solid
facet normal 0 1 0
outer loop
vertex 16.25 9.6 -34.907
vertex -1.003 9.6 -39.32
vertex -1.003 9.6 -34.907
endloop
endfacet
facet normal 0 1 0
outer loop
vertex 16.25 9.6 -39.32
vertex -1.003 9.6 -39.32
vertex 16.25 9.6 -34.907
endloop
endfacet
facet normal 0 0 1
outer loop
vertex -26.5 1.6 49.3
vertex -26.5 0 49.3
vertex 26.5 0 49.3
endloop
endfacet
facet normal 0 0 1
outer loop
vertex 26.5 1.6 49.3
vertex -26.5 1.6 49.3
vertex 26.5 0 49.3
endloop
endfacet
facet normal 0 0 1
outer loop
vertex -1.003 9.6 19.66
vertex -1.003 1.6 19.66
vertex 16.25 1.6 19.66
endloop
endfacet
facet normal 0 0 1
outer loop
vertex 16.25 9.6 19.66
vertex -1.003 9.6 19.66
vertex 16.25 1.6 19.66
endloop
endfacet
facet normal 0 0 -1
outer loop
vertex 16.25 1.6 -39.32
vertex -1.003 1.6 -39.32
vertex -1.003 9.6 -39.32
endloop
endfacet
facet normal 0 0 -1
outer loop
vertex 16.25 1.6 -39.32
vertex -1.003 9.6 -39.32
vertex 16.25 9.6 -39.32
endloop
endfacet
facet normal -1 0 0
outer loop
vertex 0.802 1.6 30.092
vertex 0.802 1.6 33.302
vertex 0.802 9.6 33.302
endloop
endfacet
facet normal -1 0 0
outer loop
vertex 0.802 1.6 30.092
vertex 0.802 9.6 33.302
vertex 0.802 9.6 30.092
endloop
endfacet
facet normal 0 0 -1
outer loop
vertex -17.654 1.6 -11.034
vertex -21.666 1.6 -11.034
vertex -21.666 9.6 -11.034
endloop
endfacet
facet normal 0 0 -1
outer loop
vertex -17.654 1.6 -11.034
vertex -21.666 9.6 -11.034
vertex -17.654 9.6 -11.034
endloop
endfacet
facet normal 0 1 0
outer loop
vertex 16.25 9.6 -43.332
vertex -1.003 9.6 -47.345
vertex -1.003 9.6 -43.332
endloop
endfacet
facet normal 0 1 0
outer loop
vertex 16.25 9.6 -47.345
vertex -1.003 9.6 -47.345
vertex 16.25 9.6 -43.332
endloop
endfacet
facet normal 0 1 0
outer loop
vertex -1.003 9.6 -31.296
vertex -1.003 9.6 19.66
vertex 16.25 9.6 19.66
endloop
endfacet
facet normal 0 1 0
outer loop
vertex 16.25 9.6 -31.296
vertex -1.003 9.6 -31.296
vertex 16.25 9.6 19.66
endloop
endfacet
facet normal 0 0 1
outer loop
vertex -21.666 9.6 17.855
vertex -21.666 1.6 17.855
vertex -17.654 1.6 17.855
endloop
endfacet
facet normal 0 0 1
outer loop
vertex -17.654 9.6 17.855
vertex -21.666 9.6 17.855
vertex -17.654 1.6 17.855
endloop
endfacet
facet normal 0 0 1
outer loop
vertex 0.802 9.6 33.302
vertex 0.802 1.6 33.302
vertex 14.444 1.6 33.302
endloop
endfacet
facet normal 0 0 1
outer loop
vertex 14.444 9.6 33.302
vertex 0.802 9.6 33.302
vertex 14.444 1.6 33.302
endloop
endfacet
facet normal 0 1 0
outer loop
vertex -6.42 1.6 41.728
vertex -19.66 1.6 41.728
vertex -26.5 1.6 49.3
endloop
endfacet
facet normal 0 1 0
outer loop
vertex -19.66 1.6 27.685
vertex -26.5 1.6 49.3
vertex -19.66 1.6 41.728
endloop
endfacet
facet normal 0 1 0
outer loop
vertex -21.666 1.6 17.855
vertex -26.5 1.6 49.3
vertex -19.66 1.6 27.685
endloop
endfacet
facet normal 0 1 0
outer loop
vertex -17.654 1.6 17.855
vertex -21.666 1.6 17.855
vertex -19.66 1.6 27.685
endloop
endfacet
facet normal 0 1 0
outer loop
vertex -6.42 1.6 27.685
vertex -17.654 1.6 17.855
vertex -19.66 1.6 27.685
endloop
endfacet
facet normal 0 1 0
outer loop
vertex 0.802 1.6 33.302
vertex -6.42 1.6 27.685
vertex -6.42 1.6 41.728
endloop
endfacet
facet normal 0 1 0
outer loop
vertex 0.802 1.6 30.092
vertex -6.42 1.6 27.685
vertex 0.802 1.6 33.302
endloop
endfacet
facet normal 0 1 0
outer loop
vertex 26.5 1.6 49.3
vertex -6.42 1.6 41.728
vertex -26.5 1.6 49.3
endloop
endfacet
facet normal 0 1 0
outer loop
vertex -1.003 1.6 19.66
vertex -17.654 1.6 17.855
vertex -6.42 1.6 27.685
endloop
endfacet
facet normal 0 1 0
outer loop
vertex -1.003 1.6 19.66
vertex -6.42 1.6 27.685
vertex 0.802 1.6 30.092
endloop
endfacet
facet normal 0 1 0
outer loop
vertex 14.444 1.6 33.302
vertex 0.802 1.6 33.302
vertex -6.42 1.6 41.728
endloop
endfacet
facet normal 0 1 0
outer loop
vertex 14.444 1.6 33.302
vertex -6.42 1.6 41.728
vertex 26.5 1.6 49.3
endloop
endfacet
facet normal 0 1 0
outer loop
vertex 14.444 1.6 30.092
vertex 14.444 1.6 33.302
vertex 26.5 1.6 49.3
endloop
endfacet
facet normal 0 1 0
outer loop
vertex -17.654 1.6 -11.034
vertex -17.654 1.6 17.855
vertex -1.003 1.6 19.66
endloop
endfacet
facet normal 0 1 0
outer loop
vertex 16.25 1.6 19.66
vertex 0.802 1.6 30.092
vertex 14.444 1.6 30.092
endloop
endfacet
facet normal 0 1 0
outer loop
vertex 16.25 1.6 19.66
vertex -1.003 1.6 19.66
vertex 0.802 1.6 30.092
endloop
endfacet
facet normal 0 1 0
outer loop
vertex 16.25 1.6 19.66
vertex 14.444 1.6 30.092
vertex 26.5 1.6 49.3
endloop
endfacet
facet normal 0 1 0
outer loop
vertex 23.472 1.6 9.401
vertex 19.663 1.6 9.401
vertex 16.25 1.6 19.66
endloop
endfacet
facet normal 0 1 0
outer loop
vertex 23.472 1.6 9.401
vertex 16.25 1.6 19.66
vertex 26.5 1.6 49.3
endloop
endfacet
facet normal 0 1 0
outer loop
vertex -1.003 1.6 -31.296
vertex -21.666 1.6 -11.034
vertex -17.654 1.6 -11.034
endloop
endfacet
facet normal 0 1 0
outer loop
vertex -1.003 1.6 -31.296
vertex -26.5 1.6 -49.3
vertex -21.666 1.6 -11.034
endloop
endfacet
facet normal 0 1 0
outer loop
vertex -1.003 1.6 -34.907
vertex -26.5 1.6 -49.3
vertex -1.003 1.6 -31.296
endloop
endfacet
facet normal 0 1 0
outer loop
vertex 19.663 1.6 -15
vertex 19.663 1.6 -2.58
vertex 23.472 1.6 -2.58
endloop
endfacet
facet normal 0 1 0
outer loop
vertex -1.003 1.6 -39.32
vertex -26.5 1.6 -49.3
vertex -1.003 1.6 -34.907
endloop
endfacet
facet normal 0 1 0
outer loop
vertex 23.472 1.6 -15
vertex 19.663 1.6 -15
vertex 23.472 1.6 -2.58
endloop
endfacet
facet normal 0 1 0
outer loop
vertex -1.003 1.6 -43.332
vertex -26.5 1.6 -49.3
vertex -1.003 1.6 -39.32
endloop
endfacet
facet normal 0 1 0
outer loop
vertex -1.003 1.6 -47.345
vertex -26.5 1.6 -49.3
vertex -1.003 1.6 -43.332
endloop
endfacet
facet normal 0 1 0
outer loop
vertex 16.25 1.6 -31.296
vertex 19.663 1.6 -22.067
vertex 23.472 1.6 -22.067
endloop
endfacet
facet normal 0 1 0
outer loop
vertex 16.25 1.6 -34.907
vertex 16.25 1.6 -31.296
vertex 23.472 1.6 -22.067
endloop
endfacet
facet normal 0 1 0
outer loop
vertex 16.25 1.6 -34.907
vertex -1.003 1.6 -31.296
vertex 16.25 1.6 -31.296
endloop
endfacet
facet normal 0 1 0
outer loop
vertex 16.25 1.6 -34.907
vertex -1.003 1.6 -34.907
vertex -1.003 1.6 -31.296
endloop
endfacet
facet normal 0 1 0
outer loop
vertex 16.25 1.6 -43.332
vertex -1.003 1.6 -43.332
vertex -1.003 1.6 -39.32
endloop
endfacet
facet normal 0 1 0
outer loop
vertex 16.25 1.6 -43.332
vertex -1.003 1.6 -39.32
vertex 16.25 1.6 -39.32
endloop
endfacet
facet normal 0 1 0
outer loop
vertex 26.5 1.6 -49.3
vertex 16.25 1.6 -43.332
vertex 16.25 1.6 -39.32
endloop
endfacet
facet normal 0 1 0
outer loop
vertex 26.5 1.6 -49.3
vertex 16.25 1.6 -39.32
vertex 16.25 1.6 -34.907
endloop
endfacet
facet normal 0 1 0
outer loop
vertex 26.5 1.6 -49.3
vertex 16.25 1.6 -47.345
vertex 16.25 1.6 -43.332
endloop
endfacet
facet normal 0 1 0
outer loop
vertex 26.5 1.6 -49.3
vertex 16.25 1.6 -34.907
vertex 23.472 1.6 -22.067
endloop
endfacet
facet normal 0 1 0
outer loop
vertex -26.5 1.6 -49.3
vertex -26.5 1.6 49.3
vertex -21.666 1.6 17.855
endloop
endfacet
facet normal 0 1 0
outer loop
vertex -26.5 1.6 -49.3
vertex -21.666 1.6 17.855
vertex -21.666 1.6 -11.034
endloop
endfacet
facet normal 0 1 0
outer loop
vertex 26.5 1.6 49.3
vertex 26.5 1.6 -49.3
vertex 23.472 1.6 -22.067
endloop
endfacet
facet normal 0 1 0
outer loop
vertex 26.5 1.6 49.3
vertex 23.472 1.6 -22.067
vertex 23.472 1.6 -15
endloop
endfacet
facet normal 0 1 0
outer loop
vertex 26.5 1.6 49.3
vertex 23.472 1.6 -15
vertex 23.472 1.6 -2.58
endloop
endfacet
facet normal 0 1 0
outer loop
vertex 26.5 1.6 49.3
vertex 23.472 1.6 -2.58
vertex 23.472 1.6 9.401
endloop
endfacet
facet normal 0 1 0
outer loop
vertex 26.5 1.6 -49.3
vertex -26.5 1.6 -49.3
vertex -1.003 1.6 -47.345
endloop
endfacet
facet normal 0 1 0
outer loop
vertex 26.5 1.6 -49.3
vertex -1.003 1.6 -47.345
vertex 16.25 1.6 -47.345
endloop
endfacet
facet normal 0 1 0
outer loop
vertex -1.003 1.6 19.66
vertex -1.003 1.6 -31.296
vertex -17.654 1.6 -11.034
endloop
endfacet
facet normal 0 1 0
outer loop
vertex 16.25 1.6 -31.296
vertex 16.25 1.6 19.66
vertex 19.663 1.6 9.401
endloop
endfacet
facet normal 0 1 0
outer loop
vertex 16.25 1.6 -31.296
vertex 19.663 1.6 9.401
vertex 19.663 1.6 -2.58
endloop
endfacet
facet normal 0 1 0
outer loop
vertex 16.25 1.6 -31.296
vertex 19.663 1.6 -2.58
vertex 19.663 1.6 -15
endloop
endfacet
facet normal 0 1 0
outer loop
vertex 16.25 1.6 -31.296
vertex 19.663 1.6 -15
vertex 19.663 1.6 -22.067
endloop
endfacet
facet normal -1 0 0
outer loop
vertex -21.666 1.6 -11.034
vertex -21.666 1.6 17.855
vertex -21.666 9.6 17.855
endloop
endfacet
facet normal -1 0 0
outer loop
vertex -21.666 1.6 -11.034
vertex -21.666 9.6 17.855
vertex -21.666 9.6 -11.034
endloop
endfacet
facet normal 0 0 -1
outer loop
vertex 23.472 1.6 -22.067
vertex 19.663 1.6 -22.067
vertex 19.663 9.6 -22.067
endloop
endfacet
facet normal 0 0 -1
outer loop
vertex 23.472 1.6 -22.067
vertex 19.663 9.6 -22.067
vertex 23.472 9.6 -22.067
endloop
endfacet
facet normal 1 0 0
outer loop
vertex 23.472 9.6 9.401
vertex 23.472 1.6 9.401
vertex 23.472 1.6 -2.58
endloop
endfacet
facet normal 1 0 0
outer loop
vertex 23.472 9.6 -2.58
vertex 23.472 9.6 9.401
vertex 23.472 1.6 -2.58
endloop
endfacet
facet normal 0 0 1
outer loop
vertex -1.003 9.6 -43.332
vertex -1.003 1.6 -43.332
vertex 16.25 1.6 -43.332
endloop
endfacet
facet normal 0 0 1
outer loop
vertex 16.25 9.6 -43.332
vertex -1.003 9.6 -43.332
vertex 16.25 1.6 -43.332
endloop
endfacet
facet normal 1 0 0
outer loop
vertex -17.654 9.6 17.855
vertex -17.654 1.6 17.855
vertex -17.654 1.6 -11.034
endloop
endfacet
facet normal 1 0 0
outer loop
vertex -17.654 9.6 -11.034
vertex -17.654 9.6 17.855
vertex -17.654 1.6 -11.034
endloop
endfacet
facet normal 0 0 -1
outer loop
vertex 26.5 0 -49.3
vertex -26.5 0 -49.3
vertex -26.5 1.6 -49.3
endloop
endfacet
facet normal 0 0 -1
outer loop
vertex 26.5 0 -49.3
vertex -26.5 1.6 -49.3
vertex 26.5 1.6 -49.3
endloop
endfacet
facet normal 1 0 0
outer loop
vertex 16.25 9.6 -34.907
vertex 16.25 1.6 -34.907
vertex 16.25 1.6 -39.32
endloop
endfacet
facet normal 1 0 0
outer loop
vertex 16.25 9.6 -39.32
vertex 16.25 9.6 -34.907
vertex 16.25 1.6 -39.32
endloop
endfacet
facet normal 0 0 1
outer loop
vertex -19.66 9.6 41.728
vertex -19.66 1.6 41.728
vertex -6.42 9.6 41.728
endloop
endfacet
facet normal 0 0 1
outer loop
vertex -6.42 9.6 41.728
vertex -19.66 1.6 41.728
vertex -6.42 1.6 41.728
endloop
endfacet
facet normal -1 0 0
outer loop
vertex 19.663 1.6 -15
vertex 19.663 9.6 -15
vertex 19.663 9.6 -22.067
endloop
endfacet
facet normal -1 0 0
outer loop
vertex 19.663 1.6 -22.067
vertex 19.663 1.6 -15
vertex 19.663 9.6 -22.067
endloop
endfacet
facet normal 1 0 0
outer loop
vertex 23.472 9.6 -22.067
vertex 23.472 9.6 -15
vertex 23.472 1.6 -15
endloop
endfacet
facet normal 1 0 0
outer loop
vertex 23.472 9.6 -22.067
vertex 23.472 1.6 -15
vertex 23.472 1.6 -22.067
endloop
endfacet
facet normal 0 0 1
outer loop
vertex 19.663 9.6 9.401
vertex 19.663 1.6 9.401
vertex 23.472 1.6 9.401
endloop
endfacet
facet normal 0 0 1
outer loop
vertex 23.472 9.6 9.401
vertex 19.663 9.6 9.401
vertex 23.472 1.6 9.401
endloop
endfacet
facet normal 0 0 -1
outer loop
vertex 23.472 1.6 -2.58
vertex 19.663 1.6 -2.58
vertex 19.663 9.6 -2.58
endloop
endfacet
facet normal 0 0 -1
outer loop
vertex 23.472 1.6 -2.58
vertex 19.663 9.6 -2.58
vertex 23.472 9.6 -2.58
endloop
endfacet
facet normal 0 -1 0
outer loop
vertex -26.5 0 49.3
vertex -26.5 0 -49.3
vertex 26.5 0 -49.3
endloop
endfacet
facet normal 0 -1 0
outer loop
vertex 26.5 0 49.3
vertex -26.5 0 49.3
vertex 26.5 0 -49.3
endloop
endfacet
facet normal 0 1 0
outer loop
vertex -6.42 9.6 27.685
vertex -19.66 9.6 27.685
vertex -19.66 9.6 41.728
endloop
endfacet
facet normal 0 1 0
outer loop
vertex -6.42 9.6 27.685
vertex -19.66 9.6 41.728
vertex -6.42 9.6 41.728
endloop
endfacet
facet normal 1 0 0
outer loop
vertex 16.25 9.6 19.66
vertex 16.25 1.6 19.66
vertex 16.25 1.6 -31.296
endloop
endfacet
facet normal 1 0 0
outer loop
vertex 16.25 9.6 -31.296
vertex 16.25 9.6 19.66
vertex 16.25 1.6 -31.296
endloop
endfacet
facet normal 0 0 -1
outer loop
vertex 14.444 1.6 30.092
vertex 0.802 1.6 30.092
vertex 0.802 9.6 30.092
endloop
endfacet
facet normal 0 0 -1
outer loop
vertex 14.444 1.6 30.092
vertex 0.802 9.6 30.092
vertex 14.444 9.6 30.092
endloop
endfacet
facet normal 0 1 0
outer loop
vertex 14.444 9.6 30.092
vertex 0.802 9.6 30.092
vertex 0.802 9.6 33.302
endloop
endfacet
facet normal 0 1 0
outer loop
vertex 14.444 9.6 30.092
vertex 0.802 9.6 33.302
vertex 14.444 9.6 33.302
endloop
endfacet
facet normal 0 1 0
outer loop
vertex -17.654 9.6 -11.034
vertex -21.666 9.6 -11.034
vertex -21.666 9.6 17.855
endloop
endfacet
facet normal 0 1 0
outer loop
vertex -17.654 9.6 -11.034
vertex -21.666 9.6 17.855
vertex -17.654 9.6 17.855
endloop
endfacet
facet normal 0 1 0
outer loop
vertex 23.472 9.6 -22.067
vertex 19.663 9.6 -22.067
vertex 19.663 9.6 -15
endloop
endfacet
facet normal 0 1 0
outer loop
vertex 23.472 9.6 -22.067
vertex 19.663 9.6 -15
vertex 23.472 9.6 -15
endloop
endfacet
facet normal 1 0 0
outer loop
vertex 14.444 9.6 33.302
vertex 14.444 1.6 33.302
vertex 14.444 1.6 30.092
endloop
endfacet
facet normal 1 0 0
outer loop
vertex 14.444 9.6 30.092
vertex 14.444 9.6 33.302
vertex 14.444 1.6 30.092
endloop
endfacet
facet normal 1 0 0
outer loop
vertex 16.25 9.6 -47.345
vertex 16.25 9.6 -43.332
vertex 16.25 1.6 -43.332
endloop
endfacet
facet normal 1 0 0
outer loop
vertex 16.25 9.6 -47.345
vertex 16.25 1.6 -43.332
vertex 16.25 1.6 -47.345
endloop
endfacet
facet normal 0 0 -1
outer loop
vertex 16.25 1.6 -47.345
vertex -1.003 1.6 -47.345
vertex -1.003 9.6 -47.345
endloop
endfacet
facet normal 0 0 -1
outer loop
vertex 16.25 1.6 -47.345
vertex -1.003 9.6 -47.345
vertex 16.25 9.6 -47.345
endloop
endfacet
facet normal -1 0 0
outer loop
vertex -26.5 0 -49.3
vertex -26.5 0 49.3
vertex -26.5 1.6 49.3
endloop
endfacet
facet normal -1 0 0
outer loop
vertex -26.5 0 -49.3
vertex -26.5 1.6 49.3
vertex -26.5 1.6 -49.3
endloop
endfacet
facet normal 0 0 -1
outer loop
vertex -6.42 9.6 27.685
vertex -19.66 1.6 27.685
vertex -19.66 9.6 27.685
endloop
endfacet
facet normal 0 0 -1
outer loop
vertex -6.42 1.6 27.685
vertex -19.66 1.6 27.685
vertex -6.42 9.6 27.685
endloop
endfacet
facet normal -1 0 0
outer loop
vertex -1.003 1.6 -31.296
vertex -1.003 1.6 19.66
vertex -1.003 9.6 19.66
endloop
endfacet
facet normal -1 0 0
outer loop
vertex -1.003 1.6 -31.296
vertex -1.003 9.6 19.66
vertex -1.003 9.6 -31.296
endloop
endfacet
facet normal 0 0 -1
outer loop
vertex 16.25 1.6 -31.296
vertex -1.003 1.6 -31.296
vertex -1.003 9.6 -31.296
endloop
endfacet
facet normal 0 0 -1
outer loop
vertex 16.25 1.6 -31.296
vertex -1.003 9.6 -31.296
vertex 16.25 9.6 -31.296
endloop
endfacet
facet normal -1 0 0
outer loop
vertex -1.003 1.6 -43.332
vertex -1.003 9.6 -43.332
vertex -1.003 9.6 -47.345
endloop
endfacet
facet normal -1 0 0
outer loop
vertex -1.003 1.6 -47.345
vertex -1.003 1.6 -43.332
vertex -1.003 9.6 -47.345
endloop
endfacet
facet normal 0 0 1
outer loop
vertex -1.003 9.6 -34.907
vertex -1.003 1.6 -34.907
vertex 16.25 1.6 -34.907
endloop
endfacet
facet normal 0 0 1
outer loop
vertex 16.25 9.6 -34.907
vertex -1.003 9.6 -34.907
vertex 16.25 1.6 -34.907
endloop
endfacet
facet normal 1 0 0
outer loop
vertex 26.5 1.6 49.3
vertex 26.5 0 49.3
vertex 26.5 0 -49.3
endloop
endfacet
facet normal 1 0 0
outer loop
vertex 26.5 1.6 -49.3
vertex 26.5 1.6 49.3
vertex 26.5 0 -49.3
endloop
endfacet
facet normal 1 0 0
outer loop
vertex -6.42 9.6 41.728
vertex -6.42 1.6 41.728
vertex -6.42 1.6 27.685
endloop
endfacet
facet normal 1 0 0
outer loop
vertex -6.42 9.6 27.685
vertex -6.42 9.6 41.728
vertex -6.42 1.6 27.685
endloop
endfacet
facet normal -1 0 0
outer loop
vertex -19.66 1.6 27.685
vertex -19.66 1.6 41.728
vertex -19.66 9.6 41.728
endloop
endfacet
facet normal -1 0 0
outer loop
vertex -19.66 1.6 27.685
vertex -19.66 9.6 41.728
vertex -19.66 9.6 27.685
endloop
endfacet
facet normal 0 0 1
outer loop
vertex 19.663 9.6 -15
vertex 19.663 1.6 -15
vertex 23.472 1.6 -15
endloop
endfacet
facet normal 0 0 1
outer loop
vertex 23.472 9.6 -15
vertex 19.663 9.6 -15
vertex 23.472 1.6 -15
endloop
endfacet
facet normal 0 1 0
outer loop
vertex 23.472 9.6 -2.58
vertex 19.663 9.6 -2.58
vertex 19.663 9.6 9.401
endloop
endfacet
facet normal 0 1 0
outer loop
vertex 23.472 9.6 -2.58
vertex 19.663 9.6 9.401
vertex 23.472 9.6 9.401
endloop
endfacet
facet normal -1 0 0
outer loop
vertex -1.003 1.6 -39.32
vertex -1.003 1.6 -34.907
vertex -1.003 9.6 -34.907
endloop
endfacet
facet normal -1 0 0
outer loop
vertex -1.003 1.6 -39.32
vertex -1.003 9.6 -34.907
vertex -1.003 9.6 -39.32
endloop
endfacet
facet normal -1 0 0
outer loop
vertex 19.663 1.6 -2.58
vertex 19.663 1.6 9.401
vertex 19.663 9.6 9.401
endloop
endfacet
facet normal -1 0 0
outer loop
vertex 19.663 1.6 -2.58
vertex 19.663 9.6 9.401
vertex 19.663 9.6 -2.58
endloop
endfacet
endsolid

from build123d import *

# Parameters (mm, degrees)
CROQUIS2_W              = 53
CROQUIS2_H              = 98.6
SALIENTE_EXTRUIR1_DEPTH = 1.6
CROQUIS3_W              = 17.252718504
CROQUIS3_H              = 50.95570349
CROQUIS3_W_2            = 13.240458387
CROQUIS3_H_2            = 14.042910411
CROQUIS3_W_3            = 4.012260117
CROQUIS3_H_3            = 28.888272845
CROQUIS3_H_4            = 4.012260117
CROQUIS3_H_5            = 4.413486129
CROQUIS3_W_4            = 3.809203095
CROQUIS3_H_6            = 7.067484179
CROQUIS3_H_7            = 11.981054517
CROQUIS3_W_5            = 13.641684399
CROQUIS3_H_8            = 3.209808094
SALIENTE_EXTRUIR2_DEPTH = 8


with BuildPart() as part:
    # Croquis2 → Saliente-Extruir1 (new body)
    with BuildSketch(Plane(origin=(0, 0, 0), x_dir=(1, 0, 0), z_dir=(0, 1, 0))):
        Rectangle(CROQUIS2_W, CROQUIS2_H)
    extrude(amount=SALIENTE_EXTRUIR1_DEPTH)

    # Croquis3 → Saliente-Extruir2 (add)
    with BuildSketch(Plane(origin=(0, 1.6, 0), x_dir=(1, 0, 0), z_dir=(0, 1, 0))):
        with Locations((7.623294223, 5.81777717)):
            Rectangle(CROQUIS3_W, CROQUIS3_H)
        with Locations((-13.039845382, -34.706050015)):
            Rectangle(CROQUIS3_W_2, CROQUIS3_H_2)
        with Locations((-19.660074575, -3.410421099)):
            Rectangle(CROQUIS3_W_3, CROQUIS3_H_3)
        with Locations((7.623294223, 45.338539326)):
            Rectangle(CROQUIS3_W, CROQUIS3_H_4)
        with Locations((7.623294223, 37.113406084)):
            Rectangle(CROQUIS3_W, CROQUIS3_H_5)
        with Locations((21.567120139, 18.533688555)):
            Rectangle(CROQUIS3_W_4, CROQUIS3_H_6)
        with Locations((21.567120139, -3.4104211)):
            Rectangle(CROQUIS3_W_4, CROQUIS3_H_7)
        with Locations((7.623294223, -31.696854927)):
            Rectangle(CROQUIS3_W_5, CROQUIS3_H_8)
    extrude(amount=SALIENTE_EXTRUIR2_DEPTH)


solid = part.part
